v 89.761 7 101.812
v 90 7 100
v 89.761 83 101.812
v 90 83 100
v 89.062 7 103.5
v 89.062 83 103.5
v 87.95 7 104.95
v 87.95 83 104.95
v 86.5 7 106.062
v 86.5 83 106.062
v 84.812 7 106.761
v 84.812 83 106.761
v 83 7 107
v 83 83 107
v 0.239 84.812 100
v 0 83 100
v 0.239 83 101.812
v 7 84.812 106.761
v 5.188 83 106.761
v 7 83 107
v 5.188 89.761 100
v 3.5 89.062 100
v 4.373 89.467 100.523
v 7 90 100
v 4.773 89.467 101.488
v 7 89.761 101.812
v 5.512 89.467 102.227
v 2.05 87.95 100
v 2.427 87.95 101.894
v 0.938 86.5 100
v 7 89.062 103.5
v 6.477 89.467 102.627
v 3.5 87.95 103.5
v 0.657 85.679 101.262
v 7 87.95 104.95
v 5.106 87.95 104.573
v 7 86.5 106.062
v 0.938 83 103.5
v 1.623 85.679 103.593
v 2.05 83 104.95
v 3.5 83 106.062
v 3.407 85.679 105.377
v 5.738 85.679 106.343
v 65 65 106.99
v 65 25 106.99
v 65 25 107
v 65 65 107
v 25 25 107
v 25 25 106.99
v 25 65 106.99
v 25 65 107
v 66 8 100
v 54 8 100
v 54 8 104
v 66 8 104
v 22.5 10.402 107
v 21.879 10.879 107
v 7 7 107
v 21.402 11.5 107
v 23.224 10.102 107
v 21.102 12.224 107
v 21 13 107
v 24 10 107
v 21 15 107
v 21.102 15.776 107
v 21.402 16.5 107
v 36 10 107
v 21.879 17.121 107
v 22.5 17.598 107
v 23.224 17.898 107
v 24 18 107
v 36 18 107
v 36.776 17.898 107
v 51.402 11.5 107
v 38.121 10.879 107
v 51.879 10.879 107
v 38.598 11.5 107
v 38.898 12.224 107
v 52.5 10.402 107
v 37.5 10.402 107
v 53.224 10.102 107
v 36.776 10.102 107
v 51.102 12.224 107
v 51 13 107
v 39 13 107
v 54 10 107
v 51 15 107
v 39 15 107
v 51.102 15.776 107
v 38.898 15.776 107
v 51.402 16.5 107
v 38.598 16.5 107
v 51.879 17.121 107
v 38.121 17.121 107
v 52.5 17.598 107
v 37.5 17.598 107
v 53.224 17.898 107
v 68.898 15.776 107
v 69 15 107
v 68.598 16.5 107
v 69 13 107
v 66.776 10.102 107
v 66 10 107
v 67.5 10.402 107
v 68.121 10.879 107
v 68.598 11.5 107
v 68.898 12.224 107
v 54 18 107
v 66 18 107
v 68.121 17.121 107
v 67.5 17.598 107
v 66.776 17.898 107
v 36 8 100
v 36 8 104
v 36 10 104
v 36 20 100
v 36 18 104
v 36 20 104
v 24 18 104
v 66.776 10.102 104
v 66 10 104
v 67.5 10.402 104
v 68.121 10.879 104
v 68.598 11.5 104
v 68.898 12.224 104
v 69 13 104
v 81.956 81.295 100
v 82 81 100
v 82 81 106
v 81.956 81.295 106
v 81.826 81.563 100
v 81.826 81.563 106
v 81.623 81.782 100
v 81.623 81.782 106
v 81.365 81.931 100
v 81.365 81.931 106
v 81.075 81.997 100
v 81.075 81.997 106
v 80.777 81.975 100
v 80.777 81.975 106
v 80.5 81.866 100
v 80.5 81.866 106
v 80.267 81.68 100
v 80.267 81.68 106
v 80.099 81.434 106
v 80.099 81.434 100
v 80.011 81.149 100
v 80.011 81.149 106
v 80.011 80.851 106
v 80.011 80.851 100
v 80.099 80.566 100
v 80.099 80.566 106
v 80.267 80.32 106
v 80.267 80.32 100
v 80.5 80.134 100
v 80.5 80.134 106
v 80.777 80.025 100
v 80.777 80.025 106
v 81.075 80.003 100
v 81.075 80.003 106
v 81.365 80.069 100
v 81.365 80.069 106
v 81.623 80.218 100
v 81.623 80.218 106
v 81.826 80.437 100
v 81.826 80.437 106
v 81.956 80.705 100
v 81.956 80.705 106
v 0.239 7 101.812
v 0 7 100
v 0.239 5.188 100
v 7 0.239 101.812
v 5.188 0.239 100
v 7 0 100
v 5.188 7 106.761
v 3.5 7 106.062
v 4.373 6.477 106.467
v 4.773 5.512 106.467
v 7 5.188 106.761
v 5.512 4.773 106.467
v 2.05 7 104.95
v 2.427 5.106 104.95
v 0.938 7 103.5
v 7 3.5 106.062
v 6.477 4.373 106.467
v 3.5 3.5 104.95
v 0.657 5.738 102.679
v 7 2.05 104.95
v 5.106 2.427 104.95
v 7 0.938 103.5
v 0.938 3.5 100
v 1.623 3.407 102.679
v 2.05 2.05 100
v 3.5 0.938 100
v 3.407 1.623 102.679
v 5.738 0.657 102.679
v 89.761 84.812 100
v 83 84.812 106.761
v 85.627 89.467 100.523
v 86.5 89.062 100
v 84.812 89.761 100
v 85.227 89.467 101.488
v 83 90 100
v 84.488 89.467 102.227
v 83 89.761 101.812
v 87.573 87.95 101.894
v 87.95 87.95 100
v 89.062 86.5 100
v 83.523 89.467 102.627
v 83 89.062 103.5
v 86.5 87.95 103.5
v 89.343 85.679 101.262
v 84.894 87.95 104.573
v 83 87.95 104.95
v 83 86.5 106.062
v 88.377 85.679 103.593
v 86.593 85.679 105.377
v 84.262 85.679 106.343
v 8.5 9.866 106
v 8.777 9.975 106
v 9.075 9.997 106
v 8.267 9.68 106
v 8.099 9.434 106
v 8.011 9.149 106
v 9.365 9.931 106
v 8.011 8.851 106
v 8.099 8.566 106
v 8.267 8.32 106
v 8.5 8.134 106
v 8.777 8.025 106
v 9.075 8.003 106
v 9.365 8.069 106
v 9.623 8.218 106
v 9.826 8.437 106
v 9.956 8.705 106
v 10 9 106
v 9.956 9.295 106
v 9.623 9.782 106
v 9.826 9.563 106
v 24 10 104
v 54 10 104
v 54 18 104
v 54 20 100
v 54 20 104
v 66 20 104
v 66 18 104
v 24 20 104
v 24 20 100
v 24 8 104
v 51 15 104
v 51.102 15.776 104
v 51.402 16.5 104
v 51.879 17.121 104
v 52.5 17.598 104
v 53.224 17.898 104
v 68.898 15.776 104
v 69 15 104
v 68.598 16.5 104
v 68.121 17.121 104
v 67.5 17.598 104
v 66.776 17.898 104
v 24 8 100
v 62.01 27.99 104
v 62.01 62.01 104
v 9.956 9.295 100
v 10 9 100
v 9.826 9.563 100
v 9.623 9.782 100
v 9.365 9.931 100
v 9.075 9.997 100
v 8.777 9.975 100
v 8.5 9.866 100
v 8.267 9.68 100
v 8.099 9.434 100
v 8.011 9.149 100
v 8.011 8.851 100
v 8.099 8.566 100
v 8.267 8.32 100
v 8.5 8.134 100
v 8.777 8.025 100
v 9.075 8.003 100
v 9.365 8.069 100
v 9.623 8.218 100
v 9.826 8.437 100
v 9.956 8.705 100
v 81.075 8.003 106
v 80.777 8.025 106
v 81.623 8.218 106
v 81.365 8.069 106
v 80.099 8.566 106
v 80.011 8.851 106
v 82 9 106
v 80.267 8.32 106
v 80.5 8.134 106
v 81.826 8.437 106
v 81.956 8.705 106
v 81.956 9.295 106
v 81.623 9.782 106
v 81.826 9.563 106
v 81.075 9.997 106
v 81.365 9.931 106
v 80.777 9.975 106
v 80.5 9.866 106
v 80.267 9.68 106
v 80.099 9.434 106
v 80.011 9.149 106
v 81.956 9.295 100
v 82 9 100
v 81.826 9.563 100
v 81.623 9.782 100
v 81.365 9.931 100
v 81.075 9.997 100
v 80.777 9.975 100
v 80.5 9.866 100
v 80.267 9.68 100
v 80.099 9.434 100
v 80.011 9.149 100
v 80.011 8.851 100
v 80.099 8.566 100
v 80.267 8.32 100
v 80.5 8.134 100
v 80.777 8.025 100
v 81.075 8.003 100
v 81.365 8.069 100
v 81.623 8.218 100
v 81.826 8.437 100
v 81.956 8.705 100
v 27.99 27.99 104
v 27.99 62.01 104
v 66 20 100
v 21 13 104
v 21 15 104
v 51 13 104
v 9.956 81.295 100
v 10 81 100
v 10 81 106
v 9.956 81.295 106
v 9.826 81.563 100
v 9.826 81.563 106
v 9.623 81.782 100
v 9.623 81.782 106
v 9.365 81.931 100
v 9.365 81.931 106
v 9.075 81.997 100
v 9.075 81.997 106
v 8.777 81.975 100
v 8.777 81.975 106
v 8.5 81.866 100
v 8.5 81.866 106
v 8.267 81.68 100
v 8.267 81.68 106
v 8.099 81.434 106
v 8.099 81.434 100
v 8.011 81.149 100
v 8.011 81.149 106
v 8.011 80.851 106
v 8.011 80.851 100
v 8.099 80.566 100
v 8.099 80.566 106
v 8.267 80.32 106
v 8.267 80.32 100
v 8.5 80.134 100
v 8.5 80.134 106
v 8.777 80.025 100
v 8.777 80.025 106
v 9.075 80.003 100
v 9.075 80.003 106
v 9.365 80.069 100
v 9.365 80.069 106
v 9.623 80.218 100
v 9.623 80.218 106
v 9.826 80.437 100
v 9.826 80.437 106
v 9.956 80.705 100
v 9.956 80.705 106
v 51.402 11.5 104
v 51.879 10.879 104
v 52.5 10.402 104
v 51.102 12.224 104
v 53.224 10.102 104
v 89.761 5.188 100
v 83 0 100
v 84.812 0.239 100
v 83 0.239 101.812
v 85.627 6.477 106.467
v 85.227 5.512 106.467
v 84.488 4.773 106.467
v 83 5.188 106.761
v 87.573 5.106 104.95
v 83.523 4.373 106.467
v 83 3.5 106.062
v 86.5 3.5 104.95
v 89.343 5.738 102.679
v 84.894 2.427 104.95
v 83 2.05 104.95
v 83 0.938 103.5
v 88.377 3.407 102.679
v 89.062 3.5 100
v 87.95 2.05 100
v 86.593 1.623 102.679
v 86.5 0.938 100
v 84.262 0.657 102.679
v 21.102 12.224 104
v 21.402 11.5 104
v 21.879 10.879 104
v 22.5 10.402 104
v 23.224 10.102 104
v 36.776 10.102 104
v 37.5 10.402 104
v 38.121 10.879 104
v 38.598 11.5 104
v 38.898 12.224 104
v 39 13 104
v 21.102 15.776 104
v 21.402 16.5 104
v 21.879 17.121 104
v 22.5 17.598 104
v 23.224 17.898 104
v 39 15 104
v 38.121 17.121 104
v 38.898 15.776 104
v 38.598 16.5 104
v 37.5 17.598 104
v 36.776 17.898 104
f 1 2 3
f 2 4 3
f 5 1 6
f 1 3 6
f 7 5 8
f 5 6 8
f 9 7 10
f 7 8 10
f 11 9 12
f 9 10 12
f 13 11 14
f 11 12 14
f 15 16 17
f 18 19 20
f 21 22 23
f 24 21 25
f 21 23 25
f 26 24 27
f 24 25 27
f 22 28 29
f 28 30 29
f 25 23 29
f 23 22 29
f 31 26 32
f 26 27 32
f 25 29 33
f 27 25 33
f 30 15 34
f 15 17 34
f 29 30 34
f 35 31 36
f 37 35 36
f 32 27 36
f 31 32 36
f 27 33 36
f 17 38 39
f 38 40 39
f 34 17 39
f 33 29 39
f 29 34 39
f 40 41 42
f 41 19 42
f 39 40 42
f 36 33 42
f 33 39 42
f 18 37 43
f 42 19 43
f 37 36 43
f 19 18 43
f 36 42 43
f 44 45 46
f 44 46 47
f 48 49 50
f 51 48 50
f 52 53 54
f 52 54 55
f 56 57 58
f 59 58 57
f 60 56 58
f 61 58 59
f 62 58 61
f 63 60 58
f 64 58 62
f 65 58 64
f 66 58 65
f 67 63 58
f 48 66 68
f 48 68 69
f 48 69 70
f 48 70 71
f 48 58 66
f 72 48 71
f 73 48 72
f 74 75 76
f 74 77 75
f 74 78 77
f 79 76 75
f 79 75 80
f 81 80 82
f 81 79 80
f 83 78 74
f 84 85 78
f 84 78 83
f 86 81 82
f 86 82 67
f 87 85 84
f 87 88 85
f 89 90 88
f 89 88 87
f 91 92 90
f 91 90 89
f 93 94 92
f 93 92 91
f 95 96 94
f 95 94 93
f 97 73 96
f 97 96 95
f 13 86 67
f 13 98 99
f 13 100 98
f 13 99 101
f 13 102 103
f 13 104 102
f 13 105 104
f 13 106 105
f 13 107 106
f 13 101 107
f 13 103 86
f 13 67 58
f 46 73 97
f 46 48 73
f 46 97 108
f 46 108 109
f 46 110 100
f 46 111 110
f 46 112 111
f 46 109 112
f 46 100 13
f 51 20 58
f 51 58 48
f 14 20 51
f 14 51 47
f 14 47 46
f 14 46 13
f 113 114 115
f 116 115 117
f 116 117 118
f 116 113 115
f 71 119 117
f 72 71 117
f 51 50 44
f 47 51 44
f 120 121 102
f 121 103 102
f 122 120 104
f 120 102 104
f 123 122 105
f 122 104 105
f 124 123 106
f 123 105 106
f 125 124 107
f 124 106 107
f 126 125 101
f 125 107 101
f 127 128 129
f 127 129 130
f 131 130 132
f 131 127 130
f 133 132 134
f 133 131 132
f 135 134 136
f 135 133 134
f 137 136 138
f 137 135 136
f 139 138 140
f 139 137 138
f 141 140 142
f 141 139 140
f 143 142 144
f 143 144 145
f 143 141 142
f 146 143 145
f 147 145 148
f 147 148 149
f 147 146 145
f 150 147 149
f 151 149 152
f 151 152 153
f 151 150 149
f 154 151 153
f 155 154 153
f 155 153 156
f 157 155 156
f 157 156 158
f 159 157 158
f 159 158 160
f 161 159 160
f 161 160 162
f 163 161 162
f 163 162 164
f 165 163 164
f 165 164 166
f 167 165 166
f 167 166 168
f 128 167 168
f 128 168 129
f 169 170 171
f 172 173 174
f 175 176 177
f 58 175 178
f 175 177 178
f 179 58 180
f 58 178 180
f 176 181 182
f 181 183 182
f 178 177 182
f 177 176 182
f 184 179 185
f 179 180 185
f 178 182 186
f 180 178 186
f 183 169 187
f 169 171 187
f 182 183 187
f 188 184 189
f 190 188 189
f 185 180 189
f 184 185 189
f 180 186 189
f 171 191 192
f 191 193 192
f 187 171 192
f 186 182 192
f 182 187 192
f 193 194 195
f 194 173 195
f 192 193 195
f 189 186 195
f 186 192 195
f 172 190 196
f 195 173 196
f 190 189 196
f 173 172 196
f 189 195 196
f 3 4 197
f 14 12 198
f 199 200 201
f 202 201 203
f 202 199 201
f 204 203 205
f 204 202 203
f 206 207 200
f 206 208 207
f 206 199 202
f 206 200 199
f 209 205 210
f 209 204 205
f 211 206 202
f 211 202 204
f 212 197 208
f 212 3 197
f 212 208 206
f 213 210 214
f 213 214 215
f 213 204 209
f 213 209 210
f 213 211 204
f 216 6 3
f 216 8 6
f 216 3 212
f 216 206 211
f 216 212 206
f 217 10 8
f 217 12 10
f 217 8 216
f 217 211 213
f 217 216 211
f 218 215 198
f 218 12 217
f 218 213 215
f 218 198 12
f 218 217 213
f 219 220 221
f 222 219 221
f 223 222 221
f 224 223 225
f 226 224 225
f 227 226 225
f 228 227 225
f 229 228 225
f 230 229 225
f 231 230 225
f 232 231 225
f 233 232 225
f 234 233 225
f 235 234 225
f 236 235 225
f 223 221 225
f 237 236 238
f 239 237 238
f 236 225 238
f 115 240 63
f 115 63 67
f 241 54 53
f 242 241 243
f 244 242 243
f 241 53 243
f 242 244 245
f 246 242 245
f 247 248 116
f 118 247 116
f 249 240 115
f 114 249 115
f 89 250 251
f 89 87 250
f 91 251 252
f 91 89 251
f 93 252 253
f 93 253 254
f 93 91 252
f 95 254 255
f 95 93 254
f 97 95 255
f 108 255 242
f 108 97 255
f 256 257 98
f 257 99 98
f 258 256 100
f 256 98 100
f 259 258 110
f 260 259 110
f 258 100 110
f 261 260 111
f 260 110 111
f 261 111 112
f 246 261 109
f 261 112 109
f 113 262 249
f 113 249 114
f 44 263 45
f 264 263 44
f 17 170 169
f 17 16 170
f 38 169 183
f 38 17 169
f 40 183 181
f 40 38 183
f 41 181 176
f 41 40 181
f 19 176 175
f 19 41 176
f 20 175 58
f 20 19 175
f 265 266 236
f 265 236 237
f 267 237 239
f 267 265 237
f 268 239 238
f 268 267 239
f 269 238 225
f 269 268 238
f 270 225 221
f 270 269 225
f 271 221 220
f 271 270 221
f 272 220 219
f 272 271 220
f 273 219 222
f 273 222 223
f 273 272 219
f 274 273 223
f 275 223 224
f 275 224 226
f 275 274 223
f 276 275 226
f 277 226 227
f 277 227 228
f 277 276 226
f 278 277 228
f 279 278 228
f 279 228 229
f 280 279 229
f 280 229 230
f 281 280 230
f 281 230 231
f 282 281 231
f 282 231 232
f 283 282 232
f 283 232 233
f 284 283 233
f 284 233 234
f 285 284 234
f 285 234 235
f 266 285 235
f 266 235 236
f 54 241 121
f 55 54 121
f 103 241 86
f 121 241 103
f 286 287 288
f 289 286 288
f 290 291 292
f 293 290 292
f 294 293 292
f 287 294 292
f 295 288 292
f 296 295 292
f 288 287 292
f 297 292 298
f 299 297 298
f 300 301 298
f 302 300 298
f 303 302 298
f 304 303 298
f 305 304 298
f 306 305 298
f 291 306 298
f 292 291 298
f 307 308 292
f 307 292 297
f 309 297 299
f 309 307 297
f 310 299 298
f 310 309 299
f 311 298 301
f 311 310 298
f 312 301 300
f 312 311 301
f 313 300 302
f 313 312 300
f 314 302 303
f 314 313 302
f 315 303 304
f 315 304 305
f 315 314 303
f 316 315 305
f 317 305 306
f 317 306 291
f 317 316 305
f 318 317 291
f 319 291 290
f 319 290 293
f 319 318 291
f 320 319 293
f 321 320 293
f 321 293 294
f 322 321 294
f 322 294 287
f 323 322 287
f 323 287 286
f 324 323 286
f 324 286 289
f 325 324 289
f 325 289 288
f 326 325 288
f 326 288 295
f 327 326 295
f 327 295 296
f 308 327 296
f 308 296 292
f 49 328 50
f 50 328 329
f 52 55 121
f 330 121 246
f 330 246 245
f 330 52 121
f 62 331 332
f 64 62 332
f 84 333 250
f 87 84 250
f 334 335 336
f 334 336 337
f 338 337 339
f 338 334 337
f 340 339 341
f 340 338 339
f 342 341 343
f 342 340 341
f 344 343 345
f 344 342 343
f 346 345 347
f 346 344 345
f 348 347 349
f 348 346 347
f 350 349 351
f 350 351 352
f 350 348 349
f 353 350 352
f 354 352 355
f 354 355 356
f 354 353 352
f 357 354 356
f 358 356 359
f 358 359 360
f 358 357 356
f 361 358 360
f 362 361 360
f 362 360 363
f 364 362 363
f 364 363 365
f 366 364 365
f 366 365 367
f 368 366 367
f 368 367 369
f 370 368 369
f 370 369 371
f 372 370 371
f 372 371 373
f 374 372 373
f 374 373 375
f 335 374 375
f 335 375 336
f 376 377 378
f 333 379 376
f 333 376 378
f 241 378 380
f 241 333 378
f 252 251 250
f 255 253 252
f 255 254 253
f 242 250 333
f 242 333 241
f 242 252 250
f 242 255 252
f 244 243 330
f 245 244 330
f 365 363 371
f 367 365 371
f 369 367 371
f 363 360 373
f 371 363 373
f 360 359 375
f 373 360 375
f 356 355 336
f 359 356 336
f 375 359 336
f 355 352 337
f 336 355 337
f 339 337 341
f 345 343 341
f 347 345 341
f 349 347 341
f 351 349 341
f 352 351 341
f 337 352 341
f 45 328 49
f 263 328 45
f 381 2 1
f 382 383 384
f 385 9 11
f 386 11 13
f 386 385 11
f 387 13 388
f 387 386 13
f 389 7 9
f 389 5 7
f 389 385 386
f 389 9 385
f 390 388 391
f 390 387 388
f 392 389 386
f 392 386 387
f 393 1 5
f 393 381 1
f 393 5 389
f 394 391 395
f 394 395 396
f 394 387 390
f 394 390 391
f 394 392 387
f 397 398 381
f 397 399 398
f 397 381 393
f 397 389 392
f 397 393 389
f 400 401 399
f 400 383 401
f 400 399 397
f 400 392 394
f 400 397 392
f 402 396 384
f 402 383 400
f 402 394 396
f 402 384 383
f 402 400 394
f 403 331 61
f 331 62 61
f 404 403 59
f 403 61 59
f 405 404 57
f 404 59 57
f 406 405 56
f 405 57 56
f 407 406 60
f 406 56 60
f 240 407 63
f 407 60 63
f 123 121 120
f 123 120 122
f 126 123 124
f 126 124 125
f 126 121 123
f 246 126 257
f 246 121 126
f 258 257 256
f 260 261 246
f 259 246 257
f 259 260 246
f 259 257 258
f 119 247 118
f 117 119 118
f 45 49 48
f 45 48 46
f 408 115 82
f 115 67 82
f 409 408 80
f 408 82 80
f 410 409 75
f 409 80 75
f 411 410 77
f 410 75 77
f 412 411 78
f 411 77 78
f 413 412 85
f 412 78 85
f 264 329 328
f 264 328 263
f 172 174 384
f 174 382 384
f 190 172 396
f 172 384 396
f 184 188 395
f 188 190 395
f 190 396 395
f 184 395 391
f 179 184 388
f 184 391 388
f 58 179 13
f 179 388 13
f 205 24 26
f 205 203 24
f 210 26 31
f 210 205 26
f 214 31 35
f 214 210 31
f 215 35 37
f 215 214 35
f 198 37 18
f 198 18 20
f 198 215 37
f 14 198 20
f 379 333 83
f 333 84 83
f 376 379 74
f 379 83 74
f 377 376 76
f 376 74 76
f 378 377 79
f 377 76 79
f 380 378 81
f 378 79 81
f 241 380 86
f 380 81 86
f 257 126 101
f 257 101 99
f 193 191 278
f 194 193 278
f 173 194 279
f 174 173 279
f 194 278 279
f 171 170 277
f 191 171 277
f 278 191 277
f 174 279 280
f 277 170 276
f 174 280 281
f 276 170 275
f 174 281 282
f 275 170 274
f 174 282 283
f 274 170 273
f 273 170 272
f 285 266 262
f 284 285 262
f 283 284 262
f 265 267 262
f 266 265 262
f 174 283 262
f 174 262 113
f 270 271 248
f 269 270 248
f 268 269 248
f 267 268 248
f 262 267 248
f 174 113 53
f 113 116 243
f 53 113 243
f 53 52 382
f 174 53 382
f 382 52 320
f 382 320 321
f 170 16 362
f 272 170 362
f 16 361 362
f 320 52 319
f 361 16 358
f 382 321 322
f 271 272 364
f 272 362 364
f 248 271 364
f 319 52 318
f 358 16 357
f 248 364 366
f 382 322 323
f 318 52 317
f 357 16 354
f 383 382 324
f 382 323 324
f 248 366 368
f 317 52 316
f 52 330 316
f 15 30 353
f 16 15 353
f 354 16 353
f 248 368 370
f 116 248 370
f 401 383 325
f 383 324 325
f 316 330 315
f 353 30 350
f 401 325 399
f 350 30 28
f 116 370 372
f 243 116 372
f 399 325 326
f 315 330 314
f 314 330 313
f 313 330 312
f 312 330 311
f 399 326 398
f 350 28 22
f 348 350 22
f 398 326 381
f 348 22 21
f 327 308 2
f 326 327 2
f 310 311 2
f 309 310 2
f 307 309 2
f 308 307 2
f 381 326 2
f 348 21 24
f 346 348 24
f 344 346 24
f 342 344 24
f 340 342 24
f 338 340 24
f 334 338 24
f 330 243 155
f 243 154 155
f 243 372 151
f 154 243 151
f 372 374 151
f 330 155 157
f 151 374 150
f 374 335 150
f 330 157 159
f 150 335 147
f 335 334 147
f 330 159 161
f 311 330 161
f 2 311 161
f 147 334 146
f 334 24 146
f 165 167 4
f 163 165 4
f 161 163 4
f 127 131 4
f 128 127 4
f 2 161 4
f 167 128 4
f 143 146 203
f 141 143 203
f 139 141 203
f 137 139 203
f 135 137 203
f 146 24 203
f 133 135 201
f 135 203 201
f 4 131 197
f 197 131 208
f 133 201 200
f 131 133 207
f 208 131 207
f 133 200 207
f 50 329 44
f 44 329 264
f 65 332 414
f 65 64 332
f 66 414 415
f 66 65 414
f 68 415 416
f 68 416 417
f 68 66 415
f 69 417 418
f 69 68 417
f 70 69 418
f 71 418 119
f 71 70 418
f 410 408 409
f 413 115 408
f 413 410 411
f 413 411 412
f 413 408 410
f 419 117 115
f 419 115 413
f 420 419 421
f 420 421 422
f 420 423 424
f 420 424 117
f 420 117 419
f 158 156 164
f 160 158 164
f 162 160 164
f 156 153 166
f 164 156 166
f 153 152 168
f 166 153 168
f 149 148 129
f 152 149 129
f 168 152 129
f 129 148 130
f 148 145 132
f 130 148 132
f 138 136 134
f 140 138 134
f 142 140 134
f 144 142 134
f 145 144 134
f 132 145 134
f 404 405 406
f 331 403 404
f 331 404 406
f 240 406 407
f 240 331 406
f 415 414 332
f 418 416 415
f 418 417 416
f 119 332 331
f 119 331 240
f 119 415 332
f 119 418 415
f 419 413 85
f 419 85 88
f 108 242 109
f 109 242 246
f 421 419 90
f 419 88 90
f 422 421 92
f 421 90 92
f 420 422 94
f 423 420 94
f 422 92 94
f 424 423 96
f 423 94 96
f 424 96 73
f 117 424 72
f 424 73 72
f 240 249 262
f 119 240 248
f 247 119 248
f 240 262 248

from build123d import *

# Parameters (mm, degrees)
BOX067_W          = 12
BOX067_H          = 12
BOX067_DEPTH      = 4
BOX069_W          = 18
BOX069_H          = 8
BOX069_DEPTH      = 3
FILLET031_R       = 3
BOX068_W          = 18
BOX068_H          = 8
BOX068_DEPTH      = 3
FILLET032_R       = 3
BOX066_W          = 12
BOX066_H          = 12
BOX066_DEPTH      = 4
CYLINDER053_R     = 1
CYLINDER053_DEPTH = 8
CYLINDER063_R     = 1
CYLINDER063_DEPTH = 8
CYLINDER060_R     = 1
CYLINDER060_DEPTH = 8
CYLINDER050_R     = 1
CYLINDER050_DEPTH = 8
BOX007_W          = 40
BOX007_H          = 40
BOX007_DEPTH      = 3
CHAMFER009_SIZE   = 2.99
BOX065_W          = 90
BOX065_H          = 90
BOX065_DEPTH      = 66
BOX063_W          = 82
BOX063_H          = 82
BOX063_DEPTH      = 75
FILLET030_R       = 6
BOX064_W          = 90
BOX064_H          = 90
BOX064_DEPTH      = 87
FILLET028_R       = 7


with BuildPart() as cube044:
    # Box067 → Box067 (new body)
    with BuildSketch(Plane(origin=(54, 8, 80), x_dir=(1, 0, 0), z_dir=(0, 0, 1))):
        with Locations((6, 6)):
            Rectangle(BOX067_W, BOX067_H)
    extrude(amount=BOX067_DEPTH)


with BuildPart() as fillet031:
    # Box069 → Box069 (new body)
    with BuildSketch(Plane(origin=(21, 10, 84), x_dir=(1, 0, 0), z_dir=(0, 0, 1))):
        with Locations((9, 4)):
            Rectangle(BOX069_W, BOX069_H)
    extrude(amount=BOX069_DEPTH)

    # Fillet031
    fillet031_edges = [fillet031.edges().sort_by_distance(p)[0] for p in [
        (21, 10, 85.5),
        (21, 18, 85.5),
        (39, 10, 85.5),
        (39, 18, 85.5),
    ]]
    fillet(fillet031_edges, radius=FILLET031_R)


with BuildPart() as fillet032:
    # Box068 → Box068 (new body)
    with BuildSketch(Plane(origin=(51, 10, 84), x_dir=(1, 0, 0), z_dir=(0, 0, 1))):
        with Locations((9, 4)):
            Rectangle(BOX068_W, BOX068_H)
    extrude(amount=BOX068_DEPTH)

    # Fillet032
    fillet032_edges = [fillet032.edges().sort_by_distance(p)[0] for p in [
        (51, 10, 85.5),
        (51, 18, 85.5),
        (69, 10, 85.5),
        (69, 18, 85.5),
    ]]
    fillet(fillet032_edges, radius=FILLET032_R)


with BuildPart() as fusion006:
    # Box066 → Box066 (new body)
    with BuildSketch(Plane(origin=(24, 8, 80), x_dir=(1, 0, 0), z_dir=(0, 0, 1))):
        with Locations((6, 6)):
            Rectangle(BOX066_W, BOX066_H)
    extrude(amount=BOX066_DEPTH)

    # Fusion006: union Cube044, Fillet031, Fillet032
    add(cube044.part)
    add(fillet031.part)
    add(fillet032.part)


with BuildPart() as cylinder058:
    # Cylinder053 → Cylinder053 (new body)
    with BuildSketch(Plane(origin=(9, 9, 78), x_dir=(1, 0, 0), z_dir=(0, 0, 1))):
        Circle(CYLINDER053_R)
    extrude(amount=CYLINDER053_DEPTH)


with BuildPart() as cylinder060:
    # Cylinder063 → Cylinder063 (new body)
    with BuildSketch(Plane(origin=(81, 81, 78), x_dir=(1, 0, 0), z_dir=(0, 0, 1))):
        Circle(CYLINDER063_R)
    extrude(amount=CYLINDER063_DEPTH)


with BuildPart() as cylinder064:
    # Cylinder060 → Cylinder060 (new body)
    with BuildSketch(Plane(origin=(81, 9, 78), x_dir=(1, 0, 0), z_dir=(0, 0, 1))):
        Circle(CYLINDER060_R)
    extrude(amount=CYLINDER060_DEPTH)


with BuildPart() as fusion005:
    # Cylinder050 → Cylinder050 (new body)
    with BuildSketch(Plane(origin=(9, 81, 78), x_dir=(1, 0, 0), z_dir=(0, 0, 1))):
        Circle(CYLINDER050_R)
    extrude(amount=CYLINDER050_DEPTH)

    # Fusion005: union Cylinder058, Cylinder060, Cylinder064
    add(cylinder058.part)
    add(cylinder060.part)
    add(cylinder064.part)


with BuildPart() as chamfer009:
    # Box007 → Box007 (new body)
    with BuildSketch(Plane(origin=(25, 25, 84), x_dir=(1, 0, 0), z_dir=(0, 0, 1))):
        with Locations((20, 20)):
            Rectangle(BOX007_W, BOX007_H)
    extrude(amount=BOX007_DEPTH)

    # Chamfer009
    chamfer009_edges = [chamfer009.edges().sort_by_distance(p)[0] for p in [
        (25, 45, 84),
        (65, 45, 84),
        (45, 25, 84),
        (45, 65, 84),
    ]]
    chamfer(chamfer009_edges, length=CHAMFER009_SIZE)


with BuildPart() as cube042:
    # Box065 → Box065 (new body)
    with BuildSketch(Plane.XY.offset(80)):
        with Locations((45, 45)):
            Rectangle(BOX065_W, BOX065_H)
    extrude(amount=BOX065_DEPTH)


with BuildPart() as fillet030:
    # Box063 → Box063 (new body)
    with BuildSketch(Plane.XY):
        with Locations((41, 41)):
            Rectangle(BOX063_W, BOX063_H)
    extrude(amount=BOX063_DEPTH)

    # Fillet030
    fillet030_edges = [fillet030.edges().sort_by_distance(p)[0] for p in [
        (0, 0, 37.5),
        (0, 41, 75),
        (0, 82, 37.5),
        (82, 0, 37.5),
        (82, 41, 75),
        (82, 82, 37.5),
        (41, 0, 75),
        (41, 82, 75),
    ]]
    fillet(fillet030_edges, radius=FILLET030_R)


with BuildPart() as fillet030_1:
    # Fillet030 placement: moved
    add(fillet030.part.moved(Location((4, 4, 4))))


with BuildPart() as top001:
    # Box064 → Box064 (new body)
    with BuildSketch(Plane.XY):
        with Locations((45, 45)):
            Rectangle(BOX064_W, BOX064_H)
    extrude(amount=BOX064_DEPTH)

    # Fillet028
    fillet028_edges = [top001.edges().sort_by_distance(p)[0] for p in [
        (0, 0, 43.5),
        (0, 45, 87),
        (0, 90, 43.5),
        (90, 0, 43.5),
        (90, 45, 87),
        (90, 90, 43.5),
        (45, 0, 87),
        (45, 90, 87),
    ]]
    fillet(fillet028_edges, radius=FILLET028_R)

    # Cut069: cut Fillet030
    add(fillet030_1.part, mode=Mode.SUBTRACT)

    # Common002: intersect Cube042
    add(cube042.part, mode=Mode.INTERSECT)

    # Cut070: cut Chamfer009
    add(chamfer009.part, mode=Mode.SUBTRACT)

    # Cut071: cut Fusion005
    add(fusion005.part, mode=Mode.SUBTRACT)

    # Cut072: cut Fusion006
    add(fusion006.part, mode=Mode.SUBTRACT)


with BuildPart() as top001_1:
    # Cut072 placement: moved
    add(top001.part.moved(Location((0, 0, 20))))


solid = top001_1.part
